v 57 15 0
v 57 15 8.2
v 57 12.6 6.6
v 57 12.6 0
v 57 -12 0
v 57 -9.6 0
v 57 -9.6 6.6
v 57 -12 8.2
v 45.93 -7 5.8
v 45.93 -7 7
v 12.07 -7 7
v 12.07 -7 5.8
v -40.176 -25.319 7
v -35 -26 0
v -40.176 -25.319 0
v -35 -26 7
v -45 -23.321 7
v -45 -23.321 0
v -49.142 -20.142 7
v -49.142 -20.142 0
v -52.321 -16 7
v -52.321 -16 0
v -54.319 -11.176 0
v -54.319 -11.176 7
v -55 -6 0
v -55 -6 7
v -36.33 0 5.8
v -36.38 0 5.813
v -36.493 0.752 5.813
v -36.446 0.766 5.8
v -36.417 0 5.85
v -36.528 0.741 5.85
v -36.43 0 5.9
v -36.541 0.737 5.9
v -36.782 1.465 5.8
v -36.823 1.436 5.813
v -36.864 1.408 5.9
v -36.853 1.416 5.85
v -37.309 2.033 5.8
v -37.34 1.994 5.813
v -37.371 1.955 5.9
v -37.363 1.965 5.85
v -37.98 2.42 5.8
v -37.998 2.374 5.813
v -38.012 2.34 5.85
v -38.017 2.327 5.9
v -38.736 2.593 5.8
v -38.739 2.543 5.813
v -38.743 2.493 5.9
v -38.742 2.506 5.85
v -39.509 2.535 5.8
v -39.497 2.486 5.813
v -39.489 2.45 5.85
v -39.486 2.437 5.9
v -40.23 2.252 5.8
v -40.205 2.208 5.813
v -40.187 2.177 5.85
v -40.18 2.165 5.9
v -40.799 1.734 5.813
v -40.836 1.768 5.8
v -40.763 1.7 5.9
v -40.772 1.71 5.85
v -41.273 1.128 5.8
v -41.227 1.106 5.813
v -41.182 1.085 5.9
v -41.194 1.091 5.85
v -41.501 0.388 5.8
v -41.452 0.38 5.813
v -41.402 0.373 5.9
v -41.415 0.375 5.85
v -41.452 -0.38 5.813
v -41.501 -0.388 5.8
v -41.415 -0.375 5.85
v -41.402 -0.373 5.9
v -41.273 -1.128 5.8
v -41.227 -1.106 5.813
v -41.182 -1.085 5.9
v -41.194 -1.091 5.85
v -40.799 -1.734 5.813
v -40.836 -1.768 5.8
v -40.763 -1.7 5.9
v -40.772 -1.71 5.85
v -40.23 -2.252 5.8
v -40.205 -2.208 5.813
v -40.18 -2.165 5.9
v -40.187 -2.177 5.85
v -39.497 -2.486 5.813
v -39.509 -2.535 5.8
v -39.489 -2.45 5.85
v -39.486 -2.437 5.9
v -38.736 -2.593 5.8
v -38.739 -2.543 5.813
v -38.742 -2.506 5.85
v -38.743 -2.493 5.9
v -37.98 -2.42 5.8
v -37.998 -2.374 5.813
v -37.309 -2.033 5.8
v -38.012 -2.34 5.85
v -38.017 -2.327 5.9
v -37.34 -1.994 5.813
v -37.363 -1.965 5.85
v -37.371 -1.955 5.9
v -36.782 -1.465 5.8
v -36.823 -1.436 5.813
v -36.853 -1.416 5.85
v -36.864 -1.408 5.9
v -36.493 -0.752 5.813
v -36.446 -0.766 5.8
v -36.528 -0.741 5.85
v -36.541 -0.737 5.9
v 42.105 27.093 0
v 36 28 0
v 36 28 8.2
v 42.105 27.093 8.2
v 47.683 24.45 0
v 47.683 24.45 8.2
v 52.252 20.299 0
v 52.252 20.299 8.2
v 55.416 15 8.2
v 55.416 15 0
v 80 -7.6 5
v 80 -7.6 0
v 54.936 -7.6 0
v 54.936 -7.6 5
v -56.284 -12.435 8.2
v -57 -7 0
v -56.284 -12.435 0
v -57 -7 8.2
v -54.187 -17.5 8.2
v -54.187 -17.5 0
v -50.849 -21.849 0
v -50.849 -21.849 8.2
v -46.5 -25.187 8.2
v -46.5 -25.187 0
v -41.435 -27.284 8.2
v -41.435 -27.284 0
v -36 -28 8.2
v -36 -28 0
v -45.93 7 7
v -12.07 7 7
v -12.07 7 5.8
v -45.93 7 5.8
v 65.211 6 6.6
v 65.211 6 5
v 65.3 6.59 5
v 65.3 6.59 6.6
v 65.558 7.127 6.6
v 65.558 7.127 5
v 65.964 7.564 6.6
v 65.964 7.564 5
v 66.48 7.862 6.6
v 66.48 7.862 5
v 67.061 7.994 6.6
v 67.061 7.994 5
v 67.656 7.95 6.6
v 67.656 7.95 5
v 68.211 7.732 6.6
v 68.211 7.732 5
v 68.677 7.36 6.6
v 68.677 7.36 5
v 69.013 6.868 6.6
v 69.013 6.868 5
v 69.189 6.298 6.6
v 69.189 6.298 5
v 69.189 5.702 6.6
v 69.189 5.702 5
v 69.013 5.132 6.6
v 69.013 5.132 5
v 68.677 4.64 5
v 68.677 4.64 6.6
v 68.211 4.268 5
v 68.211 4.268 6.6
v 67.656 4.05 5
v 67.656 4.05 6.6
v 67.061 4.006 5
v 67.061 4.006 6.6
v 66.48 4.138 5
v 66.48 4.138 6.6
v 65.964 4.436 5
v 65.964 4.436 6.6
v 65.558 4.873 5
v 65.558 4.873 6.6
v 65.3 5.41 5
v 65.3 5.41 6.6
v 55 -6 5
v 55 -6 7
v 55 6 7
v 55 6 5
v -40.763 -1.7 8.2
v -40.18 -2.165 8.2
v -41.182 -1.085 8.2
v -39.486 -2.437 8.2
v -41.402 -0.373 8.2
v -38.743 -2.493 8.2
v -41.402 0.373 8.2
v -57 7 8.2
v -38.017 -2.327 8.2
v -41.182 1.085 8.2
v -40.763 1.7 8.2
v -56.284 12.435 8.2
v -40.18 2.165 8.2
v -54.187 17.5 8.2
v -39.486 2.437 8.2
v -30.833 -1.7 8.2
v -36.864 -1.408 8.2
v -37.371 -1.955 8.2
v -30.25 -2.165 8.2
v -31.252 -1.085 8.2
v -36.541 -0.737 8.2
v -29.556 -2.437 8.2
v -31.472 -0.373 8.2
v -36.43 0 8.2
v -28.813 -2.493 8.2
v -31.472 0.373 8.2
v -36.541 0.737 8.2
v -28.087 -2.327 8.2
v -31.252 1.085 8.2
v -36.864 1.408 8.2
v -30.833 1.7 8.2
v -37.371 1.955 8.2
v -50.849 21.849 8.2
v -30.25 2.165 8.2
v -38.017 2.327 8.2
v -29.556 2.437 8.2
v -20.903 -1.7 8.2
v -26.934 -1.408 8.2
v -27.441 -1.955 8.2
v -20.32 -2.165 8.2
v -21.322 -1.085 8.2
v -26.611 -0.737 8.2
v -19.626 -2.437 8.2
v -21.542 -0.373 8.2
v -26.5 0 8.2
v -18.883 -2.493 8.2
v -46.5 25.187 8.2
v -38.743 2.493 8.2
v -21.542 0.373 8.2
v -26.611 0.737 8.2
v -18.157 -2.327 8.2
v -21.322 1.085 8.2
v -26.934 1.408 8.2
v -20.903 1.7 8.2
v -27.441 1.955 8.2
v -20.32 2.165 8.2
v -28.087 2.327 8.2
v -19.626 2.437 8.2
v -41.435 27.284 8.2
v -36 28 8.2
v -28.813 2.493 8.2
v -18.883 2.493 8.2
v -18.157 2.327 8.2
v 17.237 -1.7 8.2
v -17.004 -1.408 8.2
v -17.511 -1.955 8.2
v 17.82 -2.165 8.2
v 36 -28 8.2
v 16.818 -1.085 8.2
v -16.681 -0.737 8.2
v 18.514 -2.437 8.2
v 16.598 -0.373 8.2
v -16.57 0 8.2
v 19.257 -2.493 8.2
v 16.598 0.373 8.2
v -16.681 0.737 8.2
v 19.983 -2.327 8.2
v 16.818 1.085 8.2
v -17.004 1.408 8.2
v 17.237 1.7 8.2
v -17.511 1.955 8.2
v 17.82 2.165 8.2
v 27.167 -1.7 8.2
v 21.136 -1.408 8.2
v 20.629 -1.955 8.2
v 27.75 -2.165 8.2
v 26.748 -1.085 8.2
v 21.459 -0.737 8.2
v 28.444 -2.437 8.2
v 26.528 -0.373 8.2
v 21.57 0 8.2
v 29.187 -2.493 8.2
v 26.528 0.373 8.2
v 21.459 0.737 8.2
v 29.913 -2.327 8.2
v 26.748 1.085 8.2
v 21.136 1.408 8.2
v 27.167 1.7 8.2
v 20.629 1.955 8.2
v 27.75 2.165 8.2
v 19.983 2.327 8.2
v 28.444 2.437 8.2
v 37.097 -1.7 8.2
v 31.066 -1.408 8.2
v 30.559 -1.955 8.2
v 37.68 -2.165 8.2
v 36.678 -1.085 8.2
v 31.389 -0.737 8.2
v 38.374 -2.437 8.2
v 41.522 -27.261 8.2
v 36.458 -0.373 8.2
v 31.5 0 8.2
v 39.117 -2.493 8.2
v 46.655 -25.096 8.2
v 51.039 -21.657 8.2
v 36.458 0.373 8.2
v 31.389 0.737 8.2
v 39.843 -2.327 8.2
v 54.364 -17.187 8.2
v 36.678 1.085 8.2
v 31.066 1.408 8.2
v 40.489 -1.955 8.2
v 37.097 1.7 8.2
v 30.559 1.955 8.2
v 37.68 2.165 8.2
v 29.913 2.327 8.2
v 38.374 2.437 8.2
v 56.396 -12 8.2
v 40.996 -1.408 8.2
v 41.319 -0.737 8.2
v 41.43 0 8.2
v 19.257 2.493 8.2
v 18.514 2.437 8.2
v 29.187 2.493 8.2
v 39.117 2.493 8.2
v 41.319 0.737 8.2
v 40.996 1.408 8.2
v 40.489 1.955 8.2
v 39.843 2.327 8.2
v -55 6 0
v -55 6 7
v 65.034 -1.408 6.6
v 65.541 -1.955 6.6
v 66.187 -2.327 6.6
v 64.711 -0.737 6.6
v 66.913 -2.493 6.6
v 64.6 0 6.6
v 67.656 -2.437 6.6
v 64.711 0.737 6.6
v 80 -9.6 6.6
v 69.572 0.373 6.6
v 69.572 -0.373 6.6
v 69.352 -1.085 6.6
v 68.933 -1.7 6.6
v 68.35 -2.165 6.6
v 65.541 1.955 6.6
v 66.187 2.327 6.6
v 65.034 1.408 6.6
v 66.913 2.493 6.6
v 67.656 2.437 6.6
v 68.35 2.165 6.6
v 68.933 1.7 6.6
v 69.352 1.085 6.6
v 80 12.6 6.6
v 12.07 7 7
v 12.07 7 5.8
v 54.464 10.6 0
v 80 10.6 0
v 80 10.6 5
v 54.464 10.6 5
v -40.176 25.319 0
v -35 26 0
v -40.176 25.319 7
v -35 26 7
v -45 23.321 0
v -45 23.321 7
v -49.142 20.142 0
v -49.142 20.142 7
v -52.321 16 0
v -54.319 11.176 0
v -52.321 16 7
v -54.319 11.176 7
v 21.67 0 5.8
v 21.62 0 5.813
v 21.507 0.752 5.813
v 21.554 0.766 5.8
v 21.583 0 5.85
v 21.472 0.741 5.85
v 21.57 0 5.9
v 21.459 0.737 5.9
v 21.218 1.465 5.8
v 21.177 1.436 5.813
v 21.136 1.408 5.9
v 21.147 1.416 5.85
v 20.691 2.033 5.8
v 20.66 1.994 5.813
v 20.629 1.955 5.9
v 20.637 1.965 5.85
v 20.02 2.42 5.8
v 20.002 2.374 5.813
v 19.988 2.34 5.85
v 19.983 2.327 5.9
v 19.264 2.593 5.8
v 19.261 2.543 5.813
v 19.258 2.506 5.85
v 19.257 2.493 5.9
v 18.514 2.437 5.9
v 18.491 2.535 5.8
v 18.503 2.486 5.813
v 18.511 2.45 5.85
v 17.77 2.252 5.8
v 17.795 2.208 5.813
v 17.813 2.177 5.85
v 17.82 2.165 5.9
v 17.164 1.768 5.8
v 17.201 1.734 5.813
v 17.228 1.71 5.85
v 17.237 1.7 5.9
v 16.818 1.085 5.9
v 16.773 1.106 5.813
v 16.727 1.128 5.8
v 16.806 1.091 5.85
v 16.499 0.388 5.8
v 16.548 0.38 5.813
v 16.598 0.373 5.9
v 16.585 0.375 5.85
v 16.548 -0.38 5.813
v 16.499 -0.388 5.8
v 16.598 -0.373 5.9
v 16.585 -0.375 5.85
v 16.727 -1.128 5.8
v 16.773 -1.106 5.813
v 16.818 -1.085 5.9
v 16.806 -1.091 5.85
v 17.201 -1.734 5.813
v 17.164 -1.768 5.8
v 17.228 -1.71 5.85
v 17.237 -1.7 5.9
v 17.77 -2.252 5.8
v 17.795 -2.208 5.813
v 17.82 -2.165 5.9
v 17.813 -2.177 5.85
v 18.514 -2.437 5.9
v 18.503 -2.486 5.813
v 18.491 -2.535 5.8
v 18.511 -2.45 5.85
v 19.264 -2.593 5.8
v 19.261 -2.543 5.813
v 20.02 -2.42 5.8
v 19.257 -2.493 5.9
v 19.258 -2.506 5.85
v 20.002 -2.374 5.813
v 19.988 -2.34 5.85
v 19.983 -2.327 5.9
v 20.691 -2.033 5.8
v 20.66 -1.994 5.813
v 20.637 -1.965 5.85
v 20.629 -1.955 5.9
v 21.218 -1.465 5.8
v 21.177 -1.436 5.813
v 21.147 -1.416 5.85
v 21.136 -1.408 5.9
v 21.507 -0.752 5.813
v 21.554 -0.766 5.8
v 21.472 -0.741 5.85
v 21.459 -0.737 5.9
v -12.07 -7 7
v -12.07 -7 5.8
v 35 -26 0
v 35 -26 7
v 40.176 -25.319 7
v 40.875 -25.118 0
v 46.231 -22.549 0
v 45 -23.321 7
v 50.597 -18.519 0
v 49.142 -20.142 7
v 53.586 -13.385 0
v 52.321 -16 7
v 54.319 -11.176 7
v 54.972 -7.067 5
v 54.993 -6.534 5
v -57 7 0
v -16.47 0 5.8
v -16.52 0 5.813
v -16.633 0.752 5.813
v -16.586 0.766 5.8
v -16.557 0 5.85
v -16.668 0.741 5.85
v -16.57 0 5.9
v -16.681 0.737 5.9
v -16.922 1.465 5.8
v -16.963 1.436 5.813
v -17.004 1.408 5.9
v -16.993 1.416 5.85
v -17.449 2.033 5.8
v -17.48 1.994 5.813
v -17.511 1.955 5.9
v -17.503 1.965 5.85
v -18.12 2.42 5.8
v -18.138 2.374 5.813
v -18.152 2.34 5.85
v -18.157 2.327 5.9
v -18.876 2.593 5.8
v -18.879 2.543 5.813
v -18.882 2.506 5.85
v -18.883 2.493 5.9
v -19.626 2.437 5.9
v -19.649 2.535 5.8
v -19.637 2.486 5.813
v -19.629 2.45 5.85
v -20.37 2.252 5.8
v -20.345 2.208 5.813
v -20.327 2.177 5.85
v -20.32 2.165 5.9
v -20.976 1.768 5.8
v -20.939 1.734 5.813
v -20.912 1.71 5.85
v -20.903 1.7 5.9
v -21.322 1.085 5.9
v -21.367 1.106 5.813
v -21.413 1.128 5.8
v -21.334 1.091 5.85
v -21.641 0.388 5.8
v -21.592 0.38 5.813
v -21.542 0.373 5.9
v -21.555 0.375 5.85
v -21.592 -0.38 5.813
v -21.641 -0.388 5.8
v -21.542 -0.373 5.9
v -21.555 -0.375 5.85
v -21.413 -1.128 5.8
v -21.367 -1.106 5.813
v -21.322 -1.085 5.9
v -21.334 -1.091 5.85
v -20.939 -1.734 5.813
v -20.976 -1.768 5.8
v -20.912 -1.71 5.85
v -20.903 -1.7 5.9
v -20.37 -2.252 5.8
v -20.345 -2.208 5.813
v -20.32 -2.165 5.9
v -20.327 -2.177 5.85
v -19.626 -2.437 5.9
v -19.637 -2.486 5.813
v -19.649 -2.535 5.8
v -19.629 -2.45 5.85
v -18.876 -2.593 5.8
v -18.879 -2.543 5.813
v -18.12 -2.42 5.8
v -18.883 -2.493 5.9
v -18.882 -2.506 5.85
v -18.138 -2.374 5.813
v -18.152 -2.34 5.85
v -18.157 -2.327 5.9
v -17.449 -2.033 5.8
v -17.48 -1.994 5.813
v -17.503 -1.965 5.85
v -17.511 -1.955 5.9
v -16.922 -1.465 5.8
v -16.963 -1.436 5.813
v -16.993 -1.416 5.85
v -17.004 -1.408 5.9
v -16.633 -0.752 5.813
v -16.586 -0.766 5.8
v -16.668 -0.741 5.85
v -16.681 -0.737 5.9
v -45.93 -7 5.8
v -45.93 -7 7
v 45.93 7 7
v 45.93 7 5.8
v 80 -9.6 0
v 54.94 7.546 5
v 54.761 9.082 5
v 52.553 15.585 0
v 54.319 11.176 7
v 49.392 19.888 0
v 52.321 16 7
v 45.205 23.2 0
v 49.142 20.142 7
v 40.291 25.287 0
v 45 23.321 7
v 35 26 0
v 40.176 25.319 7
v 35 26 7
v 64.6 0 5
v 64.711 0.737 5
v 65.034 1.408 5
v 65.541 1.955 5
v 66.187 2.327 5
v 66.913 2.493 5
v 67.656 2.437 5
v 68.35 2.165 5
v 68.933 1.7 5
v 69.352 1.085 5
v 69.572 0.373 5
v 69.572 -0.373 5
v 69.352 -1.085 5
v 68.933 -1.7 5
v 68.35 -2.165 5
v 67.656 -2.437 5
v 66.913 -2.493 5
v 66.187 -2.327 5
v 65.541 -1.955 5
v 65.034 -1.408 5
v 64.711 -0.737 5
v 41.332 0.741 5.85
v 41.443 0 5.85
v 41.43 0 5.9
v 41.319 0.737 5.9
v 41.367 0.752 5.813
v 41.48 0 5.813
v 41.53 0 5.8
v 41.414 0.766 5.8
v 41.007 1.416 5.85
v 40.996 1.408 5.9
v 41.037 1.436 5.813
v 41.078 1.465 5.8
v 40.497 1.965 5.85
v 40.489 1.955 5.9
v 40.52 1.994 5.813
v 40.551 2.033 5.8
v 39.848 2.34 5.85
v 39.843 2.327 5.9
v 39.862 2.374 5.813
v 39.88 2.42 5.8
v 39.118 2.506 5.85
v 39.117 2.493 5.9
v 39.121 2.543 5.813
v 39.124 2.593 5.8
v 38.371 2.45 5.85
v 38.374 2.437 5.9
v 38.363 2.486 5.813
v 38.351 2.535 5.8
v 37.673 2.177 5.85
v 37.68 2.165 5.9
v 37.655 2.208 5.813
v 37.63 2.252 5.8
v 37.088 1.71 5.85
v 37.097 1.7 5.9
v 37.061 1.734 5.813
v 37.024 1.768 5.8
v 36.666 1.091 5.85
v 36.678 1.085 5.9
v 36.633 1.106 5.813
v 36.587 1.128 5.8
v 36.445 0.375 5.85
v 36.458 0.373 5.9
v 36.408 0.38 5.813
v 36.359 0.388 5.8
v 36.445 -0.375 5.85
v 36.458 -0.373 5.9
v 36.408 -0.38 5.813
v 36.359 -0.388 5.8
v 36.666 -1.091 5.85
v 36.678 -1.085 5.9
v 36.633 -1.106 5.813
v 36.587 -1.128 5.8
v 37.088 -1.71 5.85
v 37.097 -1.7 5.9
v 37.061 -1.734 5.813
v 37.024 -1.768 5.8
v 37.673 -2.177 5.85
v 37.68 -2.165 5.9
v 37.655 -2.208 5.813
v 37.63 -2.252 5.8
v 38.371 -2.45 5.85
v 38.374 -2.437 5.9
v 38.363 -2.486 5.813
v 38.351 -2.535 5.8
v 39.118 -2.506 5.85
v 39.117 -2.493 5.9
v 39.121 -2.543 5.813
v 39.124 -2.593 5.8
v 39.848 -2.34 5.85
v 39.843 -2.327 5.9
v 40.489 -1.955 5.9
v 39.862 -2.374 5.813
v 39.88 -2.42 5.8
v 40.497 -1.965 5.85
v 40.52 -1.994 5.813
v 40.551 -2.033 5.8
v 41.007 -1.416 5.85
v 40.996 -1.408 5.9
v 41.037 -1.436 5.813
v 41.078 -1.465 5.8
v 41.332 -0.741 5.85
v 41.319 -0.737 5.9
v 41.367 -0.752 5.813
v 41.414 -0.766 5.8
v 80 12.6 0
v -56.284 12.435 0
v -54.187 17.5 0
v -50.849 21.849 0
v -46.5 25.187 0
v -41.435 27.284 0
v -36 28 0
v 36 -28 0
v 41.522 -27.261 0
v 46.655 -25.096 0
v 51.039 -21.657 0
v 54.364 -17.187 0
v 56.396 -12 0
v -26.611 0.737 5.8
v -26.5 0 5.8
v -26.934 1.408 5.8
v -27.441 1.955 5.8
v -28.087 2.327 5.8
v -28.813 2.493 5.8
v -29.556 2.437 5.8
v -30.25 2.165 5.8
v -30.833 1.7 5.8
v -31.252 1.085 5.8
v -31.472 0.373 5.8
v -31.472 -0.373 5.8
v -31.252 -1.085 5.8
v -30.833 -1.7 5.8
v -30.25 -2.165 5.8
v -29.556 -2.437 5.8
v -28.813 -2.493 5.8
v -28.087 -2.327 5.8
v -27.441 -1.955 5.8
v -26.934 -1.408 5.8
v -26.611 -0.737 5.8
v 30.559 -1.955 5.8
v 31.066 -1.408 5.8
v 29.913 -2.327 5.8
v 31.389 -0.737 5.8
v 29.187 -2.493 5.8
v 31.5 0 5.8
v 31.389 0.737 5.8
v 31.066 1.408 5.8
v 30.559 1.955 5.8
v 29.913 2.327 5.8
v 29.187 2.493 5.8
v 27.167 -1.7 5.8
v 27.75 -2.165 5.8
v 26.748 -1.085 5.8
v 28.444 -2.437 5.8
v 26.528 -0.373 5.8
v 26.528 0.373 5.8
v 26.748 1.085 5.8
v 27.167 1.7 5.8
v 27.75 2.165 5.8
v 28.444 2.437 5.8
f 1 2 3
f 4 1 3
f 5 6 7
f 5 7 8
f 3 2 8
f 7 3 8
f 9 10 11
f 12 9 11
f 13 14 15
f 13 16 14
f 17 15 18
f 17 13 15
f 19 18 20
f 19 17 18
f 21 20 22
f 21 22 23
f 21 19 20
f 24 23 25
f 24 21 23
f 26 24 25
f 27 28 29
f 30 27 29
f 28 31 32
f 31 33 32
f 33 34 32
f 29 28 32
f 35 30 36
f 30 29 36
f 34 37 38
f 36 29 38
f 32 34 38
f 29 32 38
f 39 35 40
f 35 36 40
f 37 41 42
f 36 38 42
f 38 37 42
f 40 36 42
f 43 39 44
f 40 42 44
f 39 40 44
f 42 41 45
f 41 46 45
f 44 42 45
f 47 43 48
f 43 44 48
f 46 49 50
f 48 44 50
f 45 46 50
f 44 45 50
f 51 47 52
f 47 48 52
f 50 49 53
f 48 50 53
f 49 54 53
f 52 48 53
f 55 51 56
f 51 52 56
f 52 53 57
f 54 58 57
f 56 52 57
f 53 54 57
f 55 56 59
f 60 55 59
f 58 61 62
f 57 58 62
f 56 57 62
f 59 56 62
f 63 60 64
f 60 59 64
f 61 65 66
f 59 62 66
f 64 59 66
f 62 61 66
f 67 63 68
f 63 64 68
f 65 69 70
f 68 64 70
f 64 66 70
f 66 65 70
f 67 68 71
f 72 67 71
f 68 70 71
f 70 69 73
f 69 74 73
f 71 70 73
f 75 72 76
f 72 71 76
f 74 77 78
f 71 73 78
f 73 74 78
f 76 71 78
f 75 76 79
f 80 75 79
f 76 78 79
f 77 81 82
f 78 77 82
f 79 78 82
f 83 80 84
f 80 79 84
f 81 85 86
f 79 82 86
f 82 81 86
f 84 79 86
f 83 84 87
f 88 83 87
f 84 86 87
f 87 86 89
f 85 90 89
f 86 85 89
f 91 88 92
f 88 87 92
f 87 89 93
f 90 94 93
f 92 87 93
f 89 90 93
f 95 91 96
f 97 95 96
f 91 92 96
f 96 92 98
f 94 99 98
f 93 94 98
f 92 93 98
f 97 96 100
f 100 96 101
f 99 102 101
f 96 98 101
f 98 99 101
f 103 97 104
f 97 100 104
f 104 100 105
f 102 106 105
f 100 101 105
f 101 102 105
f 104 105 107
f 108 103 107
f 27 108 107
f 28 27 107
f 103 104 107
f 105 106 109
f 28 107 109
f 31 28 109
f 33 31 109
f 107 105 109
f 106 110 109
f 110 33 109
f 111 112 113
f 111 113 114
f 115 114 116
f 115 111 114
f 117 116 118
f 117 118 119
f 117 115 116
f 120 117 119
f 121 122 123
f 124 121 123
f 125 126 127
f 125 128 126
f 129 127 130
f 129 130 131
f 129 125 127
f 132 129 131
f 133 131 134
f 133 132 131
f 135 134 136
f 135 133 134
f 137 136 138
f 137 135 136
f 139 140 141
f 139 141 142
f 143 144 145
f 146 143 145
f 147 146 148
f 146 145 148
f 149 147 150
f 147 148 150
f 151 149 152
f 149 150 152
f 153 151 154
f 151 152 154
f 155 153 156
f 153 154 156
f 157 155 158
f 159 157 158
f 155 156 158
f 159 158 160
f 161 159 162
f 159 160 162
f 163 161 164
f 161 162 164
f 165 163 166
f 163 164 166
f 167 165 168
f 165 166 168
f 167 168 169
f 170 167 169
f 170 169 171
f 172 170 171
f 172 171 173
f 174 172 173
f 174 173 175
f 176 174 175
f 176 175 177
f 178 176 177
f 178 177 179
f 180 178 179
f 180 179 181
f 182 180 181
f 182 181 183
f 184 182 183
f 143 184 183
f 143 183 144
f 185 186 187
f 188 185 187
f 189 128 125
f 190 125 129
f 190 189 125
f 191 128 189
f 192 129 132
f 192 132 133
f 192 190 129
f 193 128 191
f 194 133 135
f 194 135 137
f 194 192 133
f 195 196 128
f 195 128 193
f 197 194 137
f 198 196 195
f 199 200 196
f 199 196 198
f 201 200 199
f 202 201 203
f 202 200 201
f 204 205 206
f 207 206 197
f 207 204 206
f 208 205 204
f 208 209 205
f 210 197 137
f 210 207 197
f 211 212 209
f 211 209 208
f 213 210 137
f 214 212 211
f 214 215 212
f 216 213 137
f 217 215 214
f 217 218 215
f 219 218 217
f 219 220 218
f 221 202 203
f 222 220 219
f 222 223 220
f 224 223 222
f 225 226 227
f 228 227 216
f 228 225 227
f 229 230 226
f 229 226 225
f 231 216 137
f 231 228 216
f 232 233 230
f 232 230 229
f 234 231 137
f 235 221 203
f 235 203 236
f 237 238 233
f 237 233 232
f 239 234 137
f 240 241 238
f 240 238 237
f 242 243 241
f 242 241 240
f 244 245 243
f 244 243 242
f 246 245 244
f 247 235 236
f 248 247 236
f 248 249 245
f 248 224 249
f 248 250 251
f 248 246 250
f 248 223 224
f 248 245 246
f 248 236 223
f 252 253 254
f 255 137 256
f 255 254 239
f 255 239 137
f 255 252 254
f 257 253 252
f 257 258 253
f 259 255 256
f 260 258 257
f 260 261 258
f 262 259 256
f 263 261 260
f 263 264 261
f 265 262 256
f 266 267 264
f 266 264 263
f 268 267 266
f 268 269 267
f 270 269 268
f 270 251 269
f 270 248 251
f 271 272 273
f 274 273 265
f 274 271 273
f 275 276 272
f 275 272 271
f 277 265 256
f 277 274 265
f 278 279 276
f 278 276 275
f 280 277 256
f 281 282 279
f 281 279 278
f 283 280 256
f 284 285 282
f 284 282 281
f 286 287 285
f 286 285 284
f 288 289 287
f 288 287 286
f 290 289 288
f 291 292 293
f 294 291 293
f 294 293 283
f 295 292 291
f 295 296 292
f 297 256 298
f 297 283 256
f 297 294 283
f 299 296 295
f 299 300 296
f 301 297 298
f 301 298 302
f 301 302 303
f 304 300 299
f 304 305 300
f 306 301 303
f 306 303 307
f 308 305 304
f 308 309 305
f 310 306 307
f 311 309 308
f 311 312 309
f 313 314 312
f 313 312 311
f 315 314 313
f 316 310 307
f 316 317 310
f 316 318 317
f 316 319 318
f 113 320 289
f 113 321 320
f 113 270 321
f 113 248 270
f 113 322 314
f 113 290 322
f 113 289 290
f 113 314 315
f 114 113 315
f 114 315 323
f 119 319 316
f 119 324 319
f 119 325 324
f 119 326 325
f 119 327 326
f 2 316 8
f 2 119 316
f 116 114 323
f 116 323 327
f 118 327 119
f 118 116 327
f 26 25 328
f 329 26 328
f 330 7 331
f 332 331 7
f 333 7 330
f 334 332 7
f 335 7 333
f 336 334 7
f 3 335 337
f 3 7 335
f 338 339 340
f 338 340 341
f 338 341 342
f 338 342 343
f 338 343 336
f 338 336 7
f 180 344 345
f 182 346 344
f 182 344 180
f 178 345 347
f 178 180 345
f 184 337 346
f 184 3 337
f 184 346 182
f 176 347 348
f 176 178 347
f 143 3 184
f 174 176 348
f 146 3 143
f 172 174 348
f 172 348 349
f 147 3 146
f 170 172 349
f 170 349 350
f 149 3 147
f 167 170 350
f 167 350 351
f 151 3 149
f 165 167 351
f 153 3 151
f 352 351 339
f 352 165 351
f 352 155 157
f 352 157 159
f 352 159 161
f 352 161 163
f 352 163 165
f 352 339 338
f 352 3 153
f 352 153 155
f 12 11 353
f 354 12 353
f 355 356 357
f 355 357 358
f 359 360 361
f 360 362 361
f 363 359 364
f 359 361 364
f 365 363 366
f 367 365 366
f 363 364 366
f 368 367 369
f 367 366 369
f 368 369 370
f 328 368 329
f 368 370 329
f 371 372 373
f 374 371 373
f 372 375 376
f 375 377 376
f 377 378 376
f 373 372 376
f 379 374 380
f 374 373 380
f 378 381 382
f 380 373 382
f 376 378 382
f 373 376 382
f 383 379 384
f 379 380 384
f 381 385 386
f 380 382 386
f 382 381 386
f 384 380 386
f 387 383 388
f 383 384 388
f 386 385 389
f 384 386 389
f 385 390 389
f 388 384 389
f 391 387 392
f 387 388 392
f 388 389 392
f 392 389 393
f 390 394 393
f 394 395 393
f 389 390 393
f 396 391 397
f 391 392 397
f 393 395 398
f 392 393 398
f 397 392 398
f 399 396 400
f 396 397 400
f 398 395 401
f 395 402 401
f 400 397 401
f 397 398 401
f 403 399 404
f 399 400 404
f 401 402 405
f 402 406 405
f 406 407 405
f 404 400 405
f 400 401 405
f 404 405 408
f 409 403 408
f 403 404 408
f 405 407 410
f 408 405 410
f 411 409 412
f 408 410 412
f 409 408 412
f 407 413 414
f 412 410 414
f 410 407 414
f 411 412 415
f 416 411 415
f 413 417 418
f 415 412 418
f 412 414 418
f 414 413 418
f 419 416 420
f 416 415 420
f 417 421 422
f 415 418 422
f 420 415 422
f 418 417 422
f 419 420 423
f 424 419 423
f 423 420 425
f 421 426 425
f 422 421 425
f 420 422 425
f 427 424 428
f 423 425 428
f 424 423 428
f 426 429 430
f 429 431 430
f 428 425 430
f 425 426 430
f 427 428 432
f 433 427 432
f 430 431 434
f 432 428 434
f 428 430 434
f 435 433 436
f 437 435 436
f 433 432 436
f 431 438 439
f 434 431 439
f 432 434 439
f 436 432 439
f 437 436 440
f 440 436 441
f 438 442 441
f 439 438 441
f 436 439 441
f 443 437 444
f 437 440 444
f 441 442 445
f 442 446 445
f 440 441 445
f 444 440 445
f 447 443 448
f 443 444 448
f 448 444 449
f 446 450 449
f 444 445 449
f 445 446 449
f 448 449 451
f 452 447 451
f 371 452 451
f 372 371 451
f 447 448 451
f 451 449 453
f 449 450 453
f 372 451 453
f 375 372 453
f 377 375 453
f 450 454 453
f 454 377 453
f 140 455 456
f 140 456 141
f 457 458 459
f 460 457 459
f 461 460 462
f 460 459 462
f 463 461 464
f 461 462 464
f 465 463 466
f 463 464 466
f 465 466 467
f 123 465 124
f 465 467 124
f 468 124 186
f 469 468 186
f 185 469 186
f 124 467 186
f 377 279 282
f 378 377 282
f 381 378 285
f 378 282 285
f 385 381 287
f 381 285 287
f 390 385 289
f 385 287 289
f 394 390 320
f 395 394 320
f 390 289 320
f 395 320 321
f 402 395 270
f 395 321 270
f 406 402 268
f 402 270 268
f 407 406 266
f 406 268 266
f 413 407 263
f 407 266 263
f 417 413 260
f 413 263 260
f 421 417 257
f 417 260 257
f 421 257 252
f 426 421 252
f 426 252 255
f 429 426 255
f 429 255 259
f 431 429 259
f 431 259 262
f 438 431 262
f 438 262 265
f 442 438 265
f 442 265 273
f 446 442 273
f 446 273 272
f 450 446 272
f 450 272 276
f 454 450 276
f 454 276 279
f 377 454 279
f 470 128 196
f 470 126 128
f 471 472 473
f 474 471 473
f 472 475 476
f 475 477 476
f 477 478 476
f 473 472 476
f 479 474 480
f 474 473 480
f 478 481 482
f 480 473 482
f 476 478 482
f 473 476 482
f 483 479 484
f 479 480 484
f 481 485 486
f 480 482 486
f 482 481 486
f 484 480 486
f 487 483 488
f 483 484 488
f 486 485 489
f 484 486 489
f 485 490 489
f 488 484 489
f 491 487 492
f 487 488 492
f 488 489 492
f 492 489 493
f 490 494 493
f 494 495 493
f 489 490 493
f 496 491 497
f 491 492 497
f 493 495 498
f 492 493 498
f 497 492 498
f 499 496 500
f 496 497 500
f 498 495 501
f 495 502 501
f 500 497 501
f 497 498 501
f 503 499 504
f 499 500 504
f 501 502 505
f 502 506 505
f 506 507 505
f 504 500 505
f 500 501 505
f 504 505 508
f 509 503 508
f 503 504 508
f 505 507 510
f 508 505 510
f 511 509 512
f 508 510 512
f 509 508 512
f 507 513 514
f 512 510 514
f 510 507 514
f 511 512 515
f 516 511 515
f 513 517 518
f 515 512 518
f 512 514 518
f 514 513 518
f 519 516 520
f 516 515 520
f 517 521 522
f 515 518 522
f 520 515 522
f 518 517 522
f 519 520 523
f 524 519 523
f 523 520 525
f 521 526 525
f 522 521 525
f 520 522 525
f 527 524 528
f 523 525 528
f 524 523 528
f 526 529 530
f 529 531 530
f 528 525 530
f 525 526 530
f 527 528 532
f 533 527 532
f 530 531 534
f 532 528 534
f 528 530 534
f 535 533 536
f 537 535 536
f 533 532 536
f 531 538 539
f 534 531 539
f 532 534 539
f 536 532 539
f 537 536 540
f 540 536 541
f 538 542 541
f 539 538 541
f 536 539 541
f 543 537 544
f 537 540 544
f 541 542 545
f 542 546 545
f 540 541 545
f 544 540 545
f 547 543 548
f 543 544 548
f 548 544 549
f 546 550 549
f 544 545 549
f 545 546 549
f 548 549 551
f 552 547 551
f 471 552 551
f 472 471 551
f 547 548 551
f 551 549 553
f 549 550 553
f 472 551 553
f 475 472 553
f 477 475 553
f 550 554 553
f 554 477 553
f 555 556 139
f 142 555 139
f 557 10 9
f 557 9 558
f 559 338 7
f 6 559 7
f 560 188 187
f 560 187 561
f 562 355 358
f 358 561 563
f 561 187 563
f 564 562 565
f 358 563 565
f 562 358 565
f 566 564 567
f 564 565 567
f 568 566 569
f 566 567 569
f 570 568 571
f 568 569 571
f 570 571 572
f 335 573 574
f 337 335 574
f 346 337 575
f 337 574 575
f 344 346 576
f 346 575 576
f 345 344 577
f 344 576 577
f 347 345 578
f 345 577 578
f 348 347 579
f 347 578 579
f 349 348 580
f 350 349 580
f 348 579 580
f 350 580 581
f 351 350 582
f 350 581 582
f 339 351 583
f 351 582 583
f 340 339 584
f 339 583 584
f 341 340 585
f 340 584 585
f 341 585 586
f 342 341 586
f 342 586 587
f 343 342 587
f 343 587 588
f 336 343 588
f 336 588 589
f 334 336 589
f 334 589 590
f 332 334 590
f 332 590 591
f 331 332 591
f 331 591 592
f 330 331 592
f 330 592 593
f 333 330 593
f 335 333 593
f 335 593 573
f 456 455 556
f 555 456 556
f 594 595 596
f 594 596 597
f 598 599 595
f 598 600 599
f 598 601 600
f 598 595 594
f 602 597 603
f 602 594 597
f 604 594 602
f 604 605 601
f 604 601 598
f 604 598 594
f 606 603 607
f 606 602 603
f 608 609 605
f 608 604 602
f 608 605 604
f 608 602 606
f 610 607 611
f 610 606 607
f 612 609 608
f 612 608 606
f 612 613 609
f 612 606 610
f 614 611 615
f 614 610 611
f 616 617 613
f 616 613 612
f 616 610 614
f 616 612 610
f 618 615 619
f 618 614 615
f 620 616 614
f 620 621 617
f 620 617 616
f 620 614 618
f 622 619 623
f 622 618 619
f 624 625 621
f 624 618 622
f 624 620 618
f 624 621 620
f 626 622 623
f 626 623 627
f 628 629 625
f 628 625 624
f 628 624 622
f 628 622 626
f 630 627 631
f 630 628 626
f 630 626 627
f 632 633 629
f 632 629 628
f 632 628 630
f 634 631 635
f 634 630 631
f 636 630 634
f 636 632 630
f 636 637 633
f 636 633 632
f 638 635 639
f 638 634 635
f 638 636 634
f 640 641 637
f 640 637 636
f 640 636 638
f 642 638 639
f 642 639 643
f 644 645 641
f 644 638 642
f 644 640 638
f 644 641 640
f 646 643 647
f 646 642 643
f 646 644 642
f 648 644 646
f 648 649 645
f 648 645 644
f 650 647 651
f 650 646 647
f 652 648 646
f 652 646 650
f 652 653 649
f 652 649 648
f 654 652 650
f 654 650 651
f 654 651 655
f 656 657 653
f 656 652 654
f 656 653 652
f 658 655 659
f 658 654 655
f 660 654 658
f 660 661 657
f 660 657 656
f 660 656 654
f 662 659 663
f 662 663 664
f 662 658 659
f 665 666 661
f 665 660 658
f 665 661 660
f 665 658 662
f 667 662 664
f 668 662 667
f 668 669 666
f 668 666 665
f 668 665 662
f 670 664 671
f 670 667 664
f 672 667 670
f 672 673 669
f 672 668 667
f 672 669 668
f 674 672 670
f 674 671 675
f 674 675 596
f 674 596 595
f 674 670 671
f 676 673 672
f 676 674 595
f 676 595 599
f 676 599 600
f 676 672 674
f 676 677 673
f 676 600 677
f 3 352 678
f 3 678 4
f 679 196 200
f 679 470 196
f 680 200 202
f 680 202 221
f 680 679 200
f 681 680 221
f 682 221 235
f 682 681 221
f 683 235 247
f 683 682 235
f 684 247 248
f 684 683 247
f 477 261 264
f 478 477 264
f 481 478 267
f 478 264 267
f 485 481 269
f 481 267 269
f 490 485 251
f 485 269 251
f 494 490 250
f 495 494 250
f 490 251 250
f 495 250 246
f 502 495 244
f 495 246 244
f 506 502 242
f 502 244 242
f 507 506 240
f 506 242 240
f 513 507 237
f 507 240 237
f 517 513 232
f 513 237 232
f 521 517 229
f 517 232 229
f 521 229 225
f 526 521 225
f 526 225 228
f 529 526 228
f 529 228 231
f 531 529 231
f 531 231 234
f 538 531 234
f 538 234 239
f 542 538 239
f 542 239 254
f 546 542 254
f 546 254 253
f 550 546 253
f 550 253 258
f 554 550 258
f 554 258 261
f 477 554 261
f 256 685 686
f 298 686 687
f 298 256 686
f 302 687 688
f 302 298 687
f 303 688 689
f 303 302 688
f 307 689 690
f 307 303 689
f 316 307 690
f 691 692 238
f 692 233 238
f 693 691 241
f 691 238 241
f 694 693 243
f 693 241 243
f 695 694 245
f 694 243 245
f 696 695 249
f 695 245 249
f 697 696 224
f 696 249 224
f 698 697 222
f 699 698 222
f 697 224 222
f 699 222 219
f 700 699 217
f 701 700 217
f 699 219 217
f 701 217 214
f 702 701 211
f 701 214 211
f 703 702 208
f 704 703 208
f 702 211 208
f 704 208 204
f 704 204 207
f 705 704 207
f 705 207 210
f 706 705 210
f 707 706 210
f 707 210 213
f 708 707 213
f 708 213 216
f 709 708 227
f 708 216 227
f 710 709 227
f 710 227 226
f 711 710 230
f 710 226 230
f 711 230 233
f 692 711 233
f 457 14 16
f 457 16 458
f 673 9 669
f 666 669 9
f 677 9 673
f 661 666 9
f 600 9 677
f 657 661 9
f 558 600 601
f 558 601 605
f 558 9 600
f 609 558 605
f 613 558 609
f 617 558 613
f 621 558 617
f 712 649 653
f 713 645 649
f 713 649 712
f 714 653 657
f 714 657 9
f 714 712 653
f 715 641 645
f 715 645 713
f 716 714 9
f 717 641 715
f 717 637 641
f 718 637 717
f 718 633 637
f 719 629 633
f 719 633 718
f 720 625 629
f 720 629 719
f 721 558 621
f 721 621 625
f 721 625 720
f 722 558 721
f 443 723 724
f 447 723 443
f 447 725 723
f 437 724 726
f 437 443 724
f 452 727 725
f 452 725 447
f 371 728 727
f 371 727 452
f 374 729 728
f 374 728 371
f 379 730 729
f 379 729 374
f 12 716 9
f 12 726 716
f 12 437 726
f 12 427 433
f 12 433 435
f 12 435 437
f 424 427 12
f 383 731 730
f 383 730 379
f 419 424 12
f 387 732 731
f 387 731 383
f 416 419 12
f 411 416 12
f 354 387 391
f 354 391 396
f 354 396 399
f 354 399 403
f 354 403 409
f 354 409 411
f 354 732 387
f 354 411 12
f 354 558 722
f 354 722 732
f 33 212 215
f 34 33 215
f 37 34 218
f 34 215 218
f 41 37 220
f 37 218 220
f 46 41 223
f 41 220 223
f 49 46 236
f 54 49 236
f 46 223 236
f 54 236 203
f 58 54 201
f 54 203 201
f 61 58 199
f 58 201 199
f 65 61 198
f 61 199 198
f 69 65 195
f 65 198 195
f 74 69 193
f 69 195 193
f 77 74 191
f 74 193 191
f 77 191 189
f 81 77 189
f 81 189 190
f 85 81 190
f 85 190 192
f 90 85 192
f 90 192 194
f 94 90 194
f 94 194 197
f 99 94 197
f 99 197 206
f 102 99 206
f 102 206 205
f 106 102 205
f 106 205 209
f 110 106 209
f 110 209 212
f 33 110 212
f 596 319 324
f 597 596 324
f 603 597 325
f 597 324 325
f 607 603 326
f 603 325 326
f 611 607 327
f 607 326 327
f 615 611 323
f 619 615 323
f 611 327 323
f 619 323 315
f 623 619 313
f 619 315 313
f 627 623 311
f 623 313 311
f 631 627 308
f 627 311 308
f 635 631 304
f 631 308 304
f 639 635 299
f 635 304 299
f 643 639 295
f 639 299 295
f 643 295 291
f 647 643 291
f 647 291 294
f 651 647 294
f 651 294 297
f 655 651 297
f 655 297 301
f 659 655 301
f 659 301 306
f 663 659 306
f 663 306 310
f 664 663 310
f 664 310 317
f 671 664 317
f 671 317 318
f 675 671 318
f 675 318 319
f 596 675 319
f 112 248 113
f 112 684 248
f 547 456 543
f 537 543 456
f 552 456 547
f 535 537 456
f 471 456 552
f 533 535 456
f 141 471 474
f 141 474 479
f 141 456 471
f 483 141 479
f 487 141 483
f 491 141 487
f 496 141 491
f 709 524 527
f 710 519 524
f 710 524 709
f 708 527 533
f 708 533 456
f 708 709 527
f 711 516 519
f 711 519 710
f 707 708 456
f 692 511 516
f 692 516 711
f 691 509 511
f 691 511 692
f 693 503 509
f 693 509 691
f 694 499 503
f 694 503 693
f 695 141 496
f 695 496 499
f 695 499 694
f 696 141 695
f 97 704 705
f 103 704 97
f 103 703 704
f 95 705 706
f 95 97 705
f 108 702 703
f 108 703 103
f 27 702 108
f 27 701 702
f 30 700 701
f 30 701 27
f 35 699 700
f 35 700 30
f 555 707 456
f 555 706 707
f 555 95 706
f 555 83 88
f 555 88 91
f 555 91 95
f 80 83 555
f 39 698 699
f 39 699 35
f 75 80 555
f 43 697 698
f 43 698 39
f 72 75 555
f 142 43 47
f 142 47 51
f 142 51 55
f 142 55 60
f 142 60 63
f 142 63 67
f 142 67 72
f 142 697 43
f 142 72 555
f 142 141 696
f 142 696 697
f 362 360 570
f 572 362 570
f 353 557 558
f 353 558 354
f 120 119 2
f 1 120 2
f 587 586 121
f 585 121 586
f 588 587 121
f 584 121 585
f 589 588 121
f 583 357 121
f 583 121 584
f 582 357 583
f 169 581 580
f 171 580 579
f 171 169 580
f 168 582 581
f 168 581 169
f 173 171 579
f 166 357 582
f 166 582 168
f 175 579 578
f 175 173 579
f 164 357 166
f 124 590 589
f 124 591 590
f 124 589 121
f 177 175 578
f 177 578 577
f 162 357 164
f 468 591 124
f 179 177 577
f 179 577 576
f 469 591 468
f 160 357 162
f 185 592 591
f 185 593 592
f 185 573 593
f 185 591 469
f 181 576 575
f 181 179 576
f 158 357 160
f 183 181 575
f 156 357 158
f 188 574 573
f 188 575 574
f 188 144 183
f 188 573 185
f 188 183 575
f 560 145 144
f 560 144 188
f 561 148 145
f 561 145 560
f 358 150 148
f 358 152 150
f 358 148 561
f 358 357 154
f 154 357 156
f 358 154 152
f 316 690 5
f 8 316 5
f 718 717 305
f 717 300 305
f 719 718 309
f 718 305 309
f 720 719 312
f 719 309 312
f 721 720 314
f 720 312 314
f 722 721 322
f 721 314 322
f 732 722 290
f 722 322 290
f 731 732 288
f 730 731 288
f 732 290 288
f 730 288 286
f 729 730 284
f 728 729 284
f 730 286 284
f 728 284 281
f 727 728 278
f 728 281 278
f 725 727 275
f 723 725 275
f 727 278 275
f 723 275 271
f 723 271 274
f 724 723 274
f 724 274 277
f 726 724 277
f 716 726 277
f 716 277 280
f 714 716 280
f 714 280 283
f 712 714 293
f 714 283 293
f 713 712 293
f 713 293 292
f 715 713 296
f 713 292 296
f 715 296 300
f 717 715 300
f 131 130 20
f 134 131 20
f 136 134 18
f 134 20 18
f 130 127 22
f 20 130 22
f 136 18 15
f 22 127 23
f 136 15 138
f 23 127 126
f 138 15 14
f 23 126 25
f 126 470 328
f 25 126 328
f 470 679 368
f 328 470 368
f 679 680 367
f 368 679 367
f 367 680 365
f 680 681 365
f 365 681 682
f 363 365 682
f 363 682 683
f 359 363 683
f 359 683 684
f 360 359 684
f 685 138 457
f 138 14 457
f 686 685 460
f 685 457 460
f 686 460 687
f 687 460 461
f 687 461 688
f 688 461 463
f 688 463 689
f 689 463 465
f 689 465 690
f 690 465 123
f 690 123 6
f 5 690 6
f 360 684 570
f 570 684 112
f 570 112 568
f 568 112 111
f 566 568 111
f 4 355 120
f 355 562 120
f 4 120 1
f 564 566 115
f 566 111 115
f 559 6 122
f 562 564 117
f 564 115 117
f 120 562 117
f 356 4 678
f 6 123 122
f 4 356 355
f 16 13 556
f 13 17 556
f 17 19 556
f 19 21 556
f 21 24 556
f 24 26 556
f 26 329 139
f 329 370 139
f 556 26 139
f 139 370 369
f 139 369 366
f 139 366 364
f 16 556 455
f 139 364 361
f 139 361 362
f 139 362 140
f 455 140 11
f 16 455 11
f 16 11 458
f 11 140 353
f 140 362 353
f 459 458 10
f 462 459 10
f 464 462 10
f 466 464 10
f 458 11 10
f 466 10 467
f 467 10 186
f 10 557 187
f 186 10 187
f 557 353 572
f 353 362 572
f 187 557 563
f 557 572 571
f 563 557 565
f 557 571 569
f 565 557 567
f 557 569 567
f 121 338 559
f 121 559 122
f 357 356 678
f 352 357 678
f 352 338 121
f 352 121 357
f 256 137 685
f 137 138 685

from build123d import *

# Parameters (mm, degrees)
SKETCH_1_W          = 114
SKETCH_1_H          = 56
SKETCH_1_W_2        = 110
SKETCH_1_H_2        = 52
EXTRUDE_1_DEPTH     = 7
SKETCH_2_W          = 114
SKETCH_2_H          = 56
EXTRUDE_1_2_DEPTH   = 1.2
SKETCH_3_R          = 2.5
CUT_EXTRUDE_1_DEPTH = 1.2
FILLET_1_R          = 20
FILLET_2_R          = 21
SKETCH_4_W          = 33.86
SKETCH_4_H          = 14
EXTRUDE_2_DEPTH     = 1.2
SKETCH_5_R          = 2.5
CUT_EXTRUDE_2_DEPTH = 1.2
FILLET_3_R          = 0.1
SKETCH_6_W          = 25
SKETCH_6_H          = 22.2
EXTRUDE_3_DEPTH     = 7
CUT_EXTRUDE_3_DEPTH = 0.4
SKETCH_8_W          = 27
SKETCH_8_H          = 18.2
CUT_EXTRUDE_4_DEPTH = 5
SKETCH_11_W         = 2
SKETCH_11_H         = 27
EXTRUDE_4_DEPTH     = 8.2
SKETCH_12_W         = 2
SKETCH_12_H         = 18.2
CUT_EXTRUDE_5_DEPTH = 5
SKETCH_13_R         = 2.5
SKETCH_13_R_2       = 2
CUT_EXTRUDE_6_DEPTH = 7


with BuildPart() as part:
    # Эскиз1 → Extrude 1 (new body)
    with BuildSketch(Plane.XY):
        Rectangle(SKETCH_1_W, SKETCH_1_H)
        Rectangle(SKETCH_1_W_2, SKETCH_1_H_2, mode=Mode.SUBTRACT)
    extrude(amount=EXTRUDE_1_DEPTH)

    # Эскиз2 → Extrude 1 2 (add)
    with BuildSketch(Plane.XY.offset(7)):
        Rectangle(SKETCH_2_W, SKETCH_2_H)
    extrude(amount=EXTRUDE_1_2_DEPTH)

    # Эскиз3 → Вырез-Вытянуть1 (cut)
    with BuildSketch(Plane.XY.offset(8.2)):
        with Locations((-38.93, 0)):
            Circle(SKETCH_3_R)
        with Locations((-29, 0)):
            Circle(SKETCH_3_R)
        with Locations((-19.07, 0)):
            Circle(SKETCH_3_R)
        with Locations((19.07, 0)):
            Circle(SKETCH_3_R)
        with Locations((29, 0)):
            Circle(SKETCH_3_R)
        with Locations((38.93, 0)):
            Circle(SKETCH_3_R)
    extrude(amount=-CUT_EXTRUDE_1_DEPTH, mode=Mode.SUBTRACT)

    # Скругление1
    fillet_1_edges = [part.edges().sort_by_distance(p)[0] for p in [
        (-55, 26, 3.5),
        (-55, -26, 3.5),
        (55, -26, 3.5),
        (55, 26, 3.5),
    ]]
    fillet(fillet_1_edges, radius=FILLET_1_R)

    # Скругление2
    fillet_2_edges = [part.edges().sort_by_distance(p)[0] for p in [
        (-57, 28, 4.1),
        (57, 28, 4.1),
        (57, -28, 4.1),
        (-57, -28, 4.1),
    ]]
    fillet(fillet_2_edges, radius=FILLET_2_R)

    # Эскиз4 → Бобышка-Вытянуть2 (add)
    with BuildSketch(Plane(origin=(0, 0, 7), x_dir=(-1, 0, 0), z_dir=(0, 0, -1))):
        with Locations((29, 0)):
            Rectangle(SKETCH_4_W, SKETCH_4_H)
        with Locations((-29, 0)):
            Rectangle(SKETCH_4_W, SKETCH_4_H)
    extrude(amount=EXTRUDE_2_DEPTH)

    # Эскиз5 → Вырез-Вытянуть2 (cut)
    with BuildSketch(Plane.XY.offset(7)):
        with Locations((-29, 0)):
            Circle(SKETCH_5_R)
        with Locations((-38.93, 0)):
            Circle(SKETCH_5_R)
        with Locations((-19.07, 0)):
            Circle(SKETCH_5_R)
        with Locations((19.07, 0)):
            Circle(SKETCH_5_R)
        with Locations((29, 0)):
            Circle(SKETCH_5_R)
        with Locations((38.93, 0)):
            Circle(SKETCH_5_R)
    extrude(amount=-CUT_EXTRUDE_2_DEPTH, mode=Mode.SUBTRACT)

    # Скругление3
    fillet_3_edges = [part.edges().sort_by_distance(p)[0] for p in [
        (36.43, 0, 5.8),
        (16.57, 0, 5.8),
        (-21.57, 0, 5.8),
        (-41.43, 0, 5.8),
    ]]
    fillet(fillet_3_edges, radius=FILLET_3_R)

    # Эскиз6 → Бобышка-Вытянуть3 (add)
    with BuildSketch(Plane(origin=(0, 0, 7), x_dir=(-1, 0, 0), z_dir=(0, 0, -1))):
        with Locations((-67.5, 1.5)):
            Rectangle(SKETCH_6_W, SKETCH_6_H)
    extrude(amount=EXTRUDE_3_DEPTH)

    # Эскиз7 → Вырез-Вытянуть3 (cut)
    with BuildSketch(Plane.XY.offset(7)):
        with BuildLine():
            Line((57, 7), (57, -7))
            ThreePointArc((57, -7), (56.959567588, -8.302507787), (56.838426044, -9.6))
            Line((56.838426044, -9.6), (80, -9.6))
            Line((80, -9.6), (80, 12.6))
            Line((80, 12.6), (56.239565213, 12.6))
            ThreePointArc((56.239565213, 12.6), (56.809022916, 9.825697306), (57, 7))
        make_face()
    extrude(amount=-CUT_EXTRUDE_3_DEPTH, mode=Mode.SUBTRACT)

    # Эскиз8 → Вырез-Вытянуть4 (cut)
    with BuildSketch(Plane(origin=(0, 0, 0), x_dir=(-1, 0, 0), z_dir=(0, 0, -1))):
        with Locations((-66.5, 1.5)):
            Rectangle(SKETCH_8_W, SKETCH_8_H)
    extrude(amount=-CUT_EXTRUDE_4_DEPTH, mode=Mode.SUBTRACT)

    # Эскиз11 → Бобышка-Вытянуть4 (add)
    with BuildSketch(Plane.XY.offset(8.2)):
        with Locations((56, 1.5)):
            Rectangle(SKETCH_11_W, SKETCH_11_H)
    extrude(amount=-EXTRUDE_4_DEPTH)

    # Эскиз12 → Вырез-Вытянуть5 (cut)
    with BuildSketch(Plane(origin=(0, 0, 0), x_dir=(-1, 0, 0), z_dir=(0, 0, -1))):
        with Locations((-56, 1.5)):
            Rectangle(SKETCH_12_W, SKETCH_12_H)
    extrude(amount=-CUT_EXTRUDE_5_DEPTH, mode=Mode.SUBTRACT)

    # Эскиз13 → Вырез-Вытянуть6 (cut)
    with BuildSketch(Plane(origin=(0, 0, 5), x_dir=(-1, 0, 0), z_dir=(0, 0, -1))):
        with Locations((-67.1, 0)):
            Circle(SKETCH_13_R)
        with Locations((-67.210919407, 6)):
            Circle(SKETCH_13_R_2)
    extrude(amount=-CUT_EXTRUDE_6_DEPTH, mode=Mode.SUBTRACT)


solid = part.part
